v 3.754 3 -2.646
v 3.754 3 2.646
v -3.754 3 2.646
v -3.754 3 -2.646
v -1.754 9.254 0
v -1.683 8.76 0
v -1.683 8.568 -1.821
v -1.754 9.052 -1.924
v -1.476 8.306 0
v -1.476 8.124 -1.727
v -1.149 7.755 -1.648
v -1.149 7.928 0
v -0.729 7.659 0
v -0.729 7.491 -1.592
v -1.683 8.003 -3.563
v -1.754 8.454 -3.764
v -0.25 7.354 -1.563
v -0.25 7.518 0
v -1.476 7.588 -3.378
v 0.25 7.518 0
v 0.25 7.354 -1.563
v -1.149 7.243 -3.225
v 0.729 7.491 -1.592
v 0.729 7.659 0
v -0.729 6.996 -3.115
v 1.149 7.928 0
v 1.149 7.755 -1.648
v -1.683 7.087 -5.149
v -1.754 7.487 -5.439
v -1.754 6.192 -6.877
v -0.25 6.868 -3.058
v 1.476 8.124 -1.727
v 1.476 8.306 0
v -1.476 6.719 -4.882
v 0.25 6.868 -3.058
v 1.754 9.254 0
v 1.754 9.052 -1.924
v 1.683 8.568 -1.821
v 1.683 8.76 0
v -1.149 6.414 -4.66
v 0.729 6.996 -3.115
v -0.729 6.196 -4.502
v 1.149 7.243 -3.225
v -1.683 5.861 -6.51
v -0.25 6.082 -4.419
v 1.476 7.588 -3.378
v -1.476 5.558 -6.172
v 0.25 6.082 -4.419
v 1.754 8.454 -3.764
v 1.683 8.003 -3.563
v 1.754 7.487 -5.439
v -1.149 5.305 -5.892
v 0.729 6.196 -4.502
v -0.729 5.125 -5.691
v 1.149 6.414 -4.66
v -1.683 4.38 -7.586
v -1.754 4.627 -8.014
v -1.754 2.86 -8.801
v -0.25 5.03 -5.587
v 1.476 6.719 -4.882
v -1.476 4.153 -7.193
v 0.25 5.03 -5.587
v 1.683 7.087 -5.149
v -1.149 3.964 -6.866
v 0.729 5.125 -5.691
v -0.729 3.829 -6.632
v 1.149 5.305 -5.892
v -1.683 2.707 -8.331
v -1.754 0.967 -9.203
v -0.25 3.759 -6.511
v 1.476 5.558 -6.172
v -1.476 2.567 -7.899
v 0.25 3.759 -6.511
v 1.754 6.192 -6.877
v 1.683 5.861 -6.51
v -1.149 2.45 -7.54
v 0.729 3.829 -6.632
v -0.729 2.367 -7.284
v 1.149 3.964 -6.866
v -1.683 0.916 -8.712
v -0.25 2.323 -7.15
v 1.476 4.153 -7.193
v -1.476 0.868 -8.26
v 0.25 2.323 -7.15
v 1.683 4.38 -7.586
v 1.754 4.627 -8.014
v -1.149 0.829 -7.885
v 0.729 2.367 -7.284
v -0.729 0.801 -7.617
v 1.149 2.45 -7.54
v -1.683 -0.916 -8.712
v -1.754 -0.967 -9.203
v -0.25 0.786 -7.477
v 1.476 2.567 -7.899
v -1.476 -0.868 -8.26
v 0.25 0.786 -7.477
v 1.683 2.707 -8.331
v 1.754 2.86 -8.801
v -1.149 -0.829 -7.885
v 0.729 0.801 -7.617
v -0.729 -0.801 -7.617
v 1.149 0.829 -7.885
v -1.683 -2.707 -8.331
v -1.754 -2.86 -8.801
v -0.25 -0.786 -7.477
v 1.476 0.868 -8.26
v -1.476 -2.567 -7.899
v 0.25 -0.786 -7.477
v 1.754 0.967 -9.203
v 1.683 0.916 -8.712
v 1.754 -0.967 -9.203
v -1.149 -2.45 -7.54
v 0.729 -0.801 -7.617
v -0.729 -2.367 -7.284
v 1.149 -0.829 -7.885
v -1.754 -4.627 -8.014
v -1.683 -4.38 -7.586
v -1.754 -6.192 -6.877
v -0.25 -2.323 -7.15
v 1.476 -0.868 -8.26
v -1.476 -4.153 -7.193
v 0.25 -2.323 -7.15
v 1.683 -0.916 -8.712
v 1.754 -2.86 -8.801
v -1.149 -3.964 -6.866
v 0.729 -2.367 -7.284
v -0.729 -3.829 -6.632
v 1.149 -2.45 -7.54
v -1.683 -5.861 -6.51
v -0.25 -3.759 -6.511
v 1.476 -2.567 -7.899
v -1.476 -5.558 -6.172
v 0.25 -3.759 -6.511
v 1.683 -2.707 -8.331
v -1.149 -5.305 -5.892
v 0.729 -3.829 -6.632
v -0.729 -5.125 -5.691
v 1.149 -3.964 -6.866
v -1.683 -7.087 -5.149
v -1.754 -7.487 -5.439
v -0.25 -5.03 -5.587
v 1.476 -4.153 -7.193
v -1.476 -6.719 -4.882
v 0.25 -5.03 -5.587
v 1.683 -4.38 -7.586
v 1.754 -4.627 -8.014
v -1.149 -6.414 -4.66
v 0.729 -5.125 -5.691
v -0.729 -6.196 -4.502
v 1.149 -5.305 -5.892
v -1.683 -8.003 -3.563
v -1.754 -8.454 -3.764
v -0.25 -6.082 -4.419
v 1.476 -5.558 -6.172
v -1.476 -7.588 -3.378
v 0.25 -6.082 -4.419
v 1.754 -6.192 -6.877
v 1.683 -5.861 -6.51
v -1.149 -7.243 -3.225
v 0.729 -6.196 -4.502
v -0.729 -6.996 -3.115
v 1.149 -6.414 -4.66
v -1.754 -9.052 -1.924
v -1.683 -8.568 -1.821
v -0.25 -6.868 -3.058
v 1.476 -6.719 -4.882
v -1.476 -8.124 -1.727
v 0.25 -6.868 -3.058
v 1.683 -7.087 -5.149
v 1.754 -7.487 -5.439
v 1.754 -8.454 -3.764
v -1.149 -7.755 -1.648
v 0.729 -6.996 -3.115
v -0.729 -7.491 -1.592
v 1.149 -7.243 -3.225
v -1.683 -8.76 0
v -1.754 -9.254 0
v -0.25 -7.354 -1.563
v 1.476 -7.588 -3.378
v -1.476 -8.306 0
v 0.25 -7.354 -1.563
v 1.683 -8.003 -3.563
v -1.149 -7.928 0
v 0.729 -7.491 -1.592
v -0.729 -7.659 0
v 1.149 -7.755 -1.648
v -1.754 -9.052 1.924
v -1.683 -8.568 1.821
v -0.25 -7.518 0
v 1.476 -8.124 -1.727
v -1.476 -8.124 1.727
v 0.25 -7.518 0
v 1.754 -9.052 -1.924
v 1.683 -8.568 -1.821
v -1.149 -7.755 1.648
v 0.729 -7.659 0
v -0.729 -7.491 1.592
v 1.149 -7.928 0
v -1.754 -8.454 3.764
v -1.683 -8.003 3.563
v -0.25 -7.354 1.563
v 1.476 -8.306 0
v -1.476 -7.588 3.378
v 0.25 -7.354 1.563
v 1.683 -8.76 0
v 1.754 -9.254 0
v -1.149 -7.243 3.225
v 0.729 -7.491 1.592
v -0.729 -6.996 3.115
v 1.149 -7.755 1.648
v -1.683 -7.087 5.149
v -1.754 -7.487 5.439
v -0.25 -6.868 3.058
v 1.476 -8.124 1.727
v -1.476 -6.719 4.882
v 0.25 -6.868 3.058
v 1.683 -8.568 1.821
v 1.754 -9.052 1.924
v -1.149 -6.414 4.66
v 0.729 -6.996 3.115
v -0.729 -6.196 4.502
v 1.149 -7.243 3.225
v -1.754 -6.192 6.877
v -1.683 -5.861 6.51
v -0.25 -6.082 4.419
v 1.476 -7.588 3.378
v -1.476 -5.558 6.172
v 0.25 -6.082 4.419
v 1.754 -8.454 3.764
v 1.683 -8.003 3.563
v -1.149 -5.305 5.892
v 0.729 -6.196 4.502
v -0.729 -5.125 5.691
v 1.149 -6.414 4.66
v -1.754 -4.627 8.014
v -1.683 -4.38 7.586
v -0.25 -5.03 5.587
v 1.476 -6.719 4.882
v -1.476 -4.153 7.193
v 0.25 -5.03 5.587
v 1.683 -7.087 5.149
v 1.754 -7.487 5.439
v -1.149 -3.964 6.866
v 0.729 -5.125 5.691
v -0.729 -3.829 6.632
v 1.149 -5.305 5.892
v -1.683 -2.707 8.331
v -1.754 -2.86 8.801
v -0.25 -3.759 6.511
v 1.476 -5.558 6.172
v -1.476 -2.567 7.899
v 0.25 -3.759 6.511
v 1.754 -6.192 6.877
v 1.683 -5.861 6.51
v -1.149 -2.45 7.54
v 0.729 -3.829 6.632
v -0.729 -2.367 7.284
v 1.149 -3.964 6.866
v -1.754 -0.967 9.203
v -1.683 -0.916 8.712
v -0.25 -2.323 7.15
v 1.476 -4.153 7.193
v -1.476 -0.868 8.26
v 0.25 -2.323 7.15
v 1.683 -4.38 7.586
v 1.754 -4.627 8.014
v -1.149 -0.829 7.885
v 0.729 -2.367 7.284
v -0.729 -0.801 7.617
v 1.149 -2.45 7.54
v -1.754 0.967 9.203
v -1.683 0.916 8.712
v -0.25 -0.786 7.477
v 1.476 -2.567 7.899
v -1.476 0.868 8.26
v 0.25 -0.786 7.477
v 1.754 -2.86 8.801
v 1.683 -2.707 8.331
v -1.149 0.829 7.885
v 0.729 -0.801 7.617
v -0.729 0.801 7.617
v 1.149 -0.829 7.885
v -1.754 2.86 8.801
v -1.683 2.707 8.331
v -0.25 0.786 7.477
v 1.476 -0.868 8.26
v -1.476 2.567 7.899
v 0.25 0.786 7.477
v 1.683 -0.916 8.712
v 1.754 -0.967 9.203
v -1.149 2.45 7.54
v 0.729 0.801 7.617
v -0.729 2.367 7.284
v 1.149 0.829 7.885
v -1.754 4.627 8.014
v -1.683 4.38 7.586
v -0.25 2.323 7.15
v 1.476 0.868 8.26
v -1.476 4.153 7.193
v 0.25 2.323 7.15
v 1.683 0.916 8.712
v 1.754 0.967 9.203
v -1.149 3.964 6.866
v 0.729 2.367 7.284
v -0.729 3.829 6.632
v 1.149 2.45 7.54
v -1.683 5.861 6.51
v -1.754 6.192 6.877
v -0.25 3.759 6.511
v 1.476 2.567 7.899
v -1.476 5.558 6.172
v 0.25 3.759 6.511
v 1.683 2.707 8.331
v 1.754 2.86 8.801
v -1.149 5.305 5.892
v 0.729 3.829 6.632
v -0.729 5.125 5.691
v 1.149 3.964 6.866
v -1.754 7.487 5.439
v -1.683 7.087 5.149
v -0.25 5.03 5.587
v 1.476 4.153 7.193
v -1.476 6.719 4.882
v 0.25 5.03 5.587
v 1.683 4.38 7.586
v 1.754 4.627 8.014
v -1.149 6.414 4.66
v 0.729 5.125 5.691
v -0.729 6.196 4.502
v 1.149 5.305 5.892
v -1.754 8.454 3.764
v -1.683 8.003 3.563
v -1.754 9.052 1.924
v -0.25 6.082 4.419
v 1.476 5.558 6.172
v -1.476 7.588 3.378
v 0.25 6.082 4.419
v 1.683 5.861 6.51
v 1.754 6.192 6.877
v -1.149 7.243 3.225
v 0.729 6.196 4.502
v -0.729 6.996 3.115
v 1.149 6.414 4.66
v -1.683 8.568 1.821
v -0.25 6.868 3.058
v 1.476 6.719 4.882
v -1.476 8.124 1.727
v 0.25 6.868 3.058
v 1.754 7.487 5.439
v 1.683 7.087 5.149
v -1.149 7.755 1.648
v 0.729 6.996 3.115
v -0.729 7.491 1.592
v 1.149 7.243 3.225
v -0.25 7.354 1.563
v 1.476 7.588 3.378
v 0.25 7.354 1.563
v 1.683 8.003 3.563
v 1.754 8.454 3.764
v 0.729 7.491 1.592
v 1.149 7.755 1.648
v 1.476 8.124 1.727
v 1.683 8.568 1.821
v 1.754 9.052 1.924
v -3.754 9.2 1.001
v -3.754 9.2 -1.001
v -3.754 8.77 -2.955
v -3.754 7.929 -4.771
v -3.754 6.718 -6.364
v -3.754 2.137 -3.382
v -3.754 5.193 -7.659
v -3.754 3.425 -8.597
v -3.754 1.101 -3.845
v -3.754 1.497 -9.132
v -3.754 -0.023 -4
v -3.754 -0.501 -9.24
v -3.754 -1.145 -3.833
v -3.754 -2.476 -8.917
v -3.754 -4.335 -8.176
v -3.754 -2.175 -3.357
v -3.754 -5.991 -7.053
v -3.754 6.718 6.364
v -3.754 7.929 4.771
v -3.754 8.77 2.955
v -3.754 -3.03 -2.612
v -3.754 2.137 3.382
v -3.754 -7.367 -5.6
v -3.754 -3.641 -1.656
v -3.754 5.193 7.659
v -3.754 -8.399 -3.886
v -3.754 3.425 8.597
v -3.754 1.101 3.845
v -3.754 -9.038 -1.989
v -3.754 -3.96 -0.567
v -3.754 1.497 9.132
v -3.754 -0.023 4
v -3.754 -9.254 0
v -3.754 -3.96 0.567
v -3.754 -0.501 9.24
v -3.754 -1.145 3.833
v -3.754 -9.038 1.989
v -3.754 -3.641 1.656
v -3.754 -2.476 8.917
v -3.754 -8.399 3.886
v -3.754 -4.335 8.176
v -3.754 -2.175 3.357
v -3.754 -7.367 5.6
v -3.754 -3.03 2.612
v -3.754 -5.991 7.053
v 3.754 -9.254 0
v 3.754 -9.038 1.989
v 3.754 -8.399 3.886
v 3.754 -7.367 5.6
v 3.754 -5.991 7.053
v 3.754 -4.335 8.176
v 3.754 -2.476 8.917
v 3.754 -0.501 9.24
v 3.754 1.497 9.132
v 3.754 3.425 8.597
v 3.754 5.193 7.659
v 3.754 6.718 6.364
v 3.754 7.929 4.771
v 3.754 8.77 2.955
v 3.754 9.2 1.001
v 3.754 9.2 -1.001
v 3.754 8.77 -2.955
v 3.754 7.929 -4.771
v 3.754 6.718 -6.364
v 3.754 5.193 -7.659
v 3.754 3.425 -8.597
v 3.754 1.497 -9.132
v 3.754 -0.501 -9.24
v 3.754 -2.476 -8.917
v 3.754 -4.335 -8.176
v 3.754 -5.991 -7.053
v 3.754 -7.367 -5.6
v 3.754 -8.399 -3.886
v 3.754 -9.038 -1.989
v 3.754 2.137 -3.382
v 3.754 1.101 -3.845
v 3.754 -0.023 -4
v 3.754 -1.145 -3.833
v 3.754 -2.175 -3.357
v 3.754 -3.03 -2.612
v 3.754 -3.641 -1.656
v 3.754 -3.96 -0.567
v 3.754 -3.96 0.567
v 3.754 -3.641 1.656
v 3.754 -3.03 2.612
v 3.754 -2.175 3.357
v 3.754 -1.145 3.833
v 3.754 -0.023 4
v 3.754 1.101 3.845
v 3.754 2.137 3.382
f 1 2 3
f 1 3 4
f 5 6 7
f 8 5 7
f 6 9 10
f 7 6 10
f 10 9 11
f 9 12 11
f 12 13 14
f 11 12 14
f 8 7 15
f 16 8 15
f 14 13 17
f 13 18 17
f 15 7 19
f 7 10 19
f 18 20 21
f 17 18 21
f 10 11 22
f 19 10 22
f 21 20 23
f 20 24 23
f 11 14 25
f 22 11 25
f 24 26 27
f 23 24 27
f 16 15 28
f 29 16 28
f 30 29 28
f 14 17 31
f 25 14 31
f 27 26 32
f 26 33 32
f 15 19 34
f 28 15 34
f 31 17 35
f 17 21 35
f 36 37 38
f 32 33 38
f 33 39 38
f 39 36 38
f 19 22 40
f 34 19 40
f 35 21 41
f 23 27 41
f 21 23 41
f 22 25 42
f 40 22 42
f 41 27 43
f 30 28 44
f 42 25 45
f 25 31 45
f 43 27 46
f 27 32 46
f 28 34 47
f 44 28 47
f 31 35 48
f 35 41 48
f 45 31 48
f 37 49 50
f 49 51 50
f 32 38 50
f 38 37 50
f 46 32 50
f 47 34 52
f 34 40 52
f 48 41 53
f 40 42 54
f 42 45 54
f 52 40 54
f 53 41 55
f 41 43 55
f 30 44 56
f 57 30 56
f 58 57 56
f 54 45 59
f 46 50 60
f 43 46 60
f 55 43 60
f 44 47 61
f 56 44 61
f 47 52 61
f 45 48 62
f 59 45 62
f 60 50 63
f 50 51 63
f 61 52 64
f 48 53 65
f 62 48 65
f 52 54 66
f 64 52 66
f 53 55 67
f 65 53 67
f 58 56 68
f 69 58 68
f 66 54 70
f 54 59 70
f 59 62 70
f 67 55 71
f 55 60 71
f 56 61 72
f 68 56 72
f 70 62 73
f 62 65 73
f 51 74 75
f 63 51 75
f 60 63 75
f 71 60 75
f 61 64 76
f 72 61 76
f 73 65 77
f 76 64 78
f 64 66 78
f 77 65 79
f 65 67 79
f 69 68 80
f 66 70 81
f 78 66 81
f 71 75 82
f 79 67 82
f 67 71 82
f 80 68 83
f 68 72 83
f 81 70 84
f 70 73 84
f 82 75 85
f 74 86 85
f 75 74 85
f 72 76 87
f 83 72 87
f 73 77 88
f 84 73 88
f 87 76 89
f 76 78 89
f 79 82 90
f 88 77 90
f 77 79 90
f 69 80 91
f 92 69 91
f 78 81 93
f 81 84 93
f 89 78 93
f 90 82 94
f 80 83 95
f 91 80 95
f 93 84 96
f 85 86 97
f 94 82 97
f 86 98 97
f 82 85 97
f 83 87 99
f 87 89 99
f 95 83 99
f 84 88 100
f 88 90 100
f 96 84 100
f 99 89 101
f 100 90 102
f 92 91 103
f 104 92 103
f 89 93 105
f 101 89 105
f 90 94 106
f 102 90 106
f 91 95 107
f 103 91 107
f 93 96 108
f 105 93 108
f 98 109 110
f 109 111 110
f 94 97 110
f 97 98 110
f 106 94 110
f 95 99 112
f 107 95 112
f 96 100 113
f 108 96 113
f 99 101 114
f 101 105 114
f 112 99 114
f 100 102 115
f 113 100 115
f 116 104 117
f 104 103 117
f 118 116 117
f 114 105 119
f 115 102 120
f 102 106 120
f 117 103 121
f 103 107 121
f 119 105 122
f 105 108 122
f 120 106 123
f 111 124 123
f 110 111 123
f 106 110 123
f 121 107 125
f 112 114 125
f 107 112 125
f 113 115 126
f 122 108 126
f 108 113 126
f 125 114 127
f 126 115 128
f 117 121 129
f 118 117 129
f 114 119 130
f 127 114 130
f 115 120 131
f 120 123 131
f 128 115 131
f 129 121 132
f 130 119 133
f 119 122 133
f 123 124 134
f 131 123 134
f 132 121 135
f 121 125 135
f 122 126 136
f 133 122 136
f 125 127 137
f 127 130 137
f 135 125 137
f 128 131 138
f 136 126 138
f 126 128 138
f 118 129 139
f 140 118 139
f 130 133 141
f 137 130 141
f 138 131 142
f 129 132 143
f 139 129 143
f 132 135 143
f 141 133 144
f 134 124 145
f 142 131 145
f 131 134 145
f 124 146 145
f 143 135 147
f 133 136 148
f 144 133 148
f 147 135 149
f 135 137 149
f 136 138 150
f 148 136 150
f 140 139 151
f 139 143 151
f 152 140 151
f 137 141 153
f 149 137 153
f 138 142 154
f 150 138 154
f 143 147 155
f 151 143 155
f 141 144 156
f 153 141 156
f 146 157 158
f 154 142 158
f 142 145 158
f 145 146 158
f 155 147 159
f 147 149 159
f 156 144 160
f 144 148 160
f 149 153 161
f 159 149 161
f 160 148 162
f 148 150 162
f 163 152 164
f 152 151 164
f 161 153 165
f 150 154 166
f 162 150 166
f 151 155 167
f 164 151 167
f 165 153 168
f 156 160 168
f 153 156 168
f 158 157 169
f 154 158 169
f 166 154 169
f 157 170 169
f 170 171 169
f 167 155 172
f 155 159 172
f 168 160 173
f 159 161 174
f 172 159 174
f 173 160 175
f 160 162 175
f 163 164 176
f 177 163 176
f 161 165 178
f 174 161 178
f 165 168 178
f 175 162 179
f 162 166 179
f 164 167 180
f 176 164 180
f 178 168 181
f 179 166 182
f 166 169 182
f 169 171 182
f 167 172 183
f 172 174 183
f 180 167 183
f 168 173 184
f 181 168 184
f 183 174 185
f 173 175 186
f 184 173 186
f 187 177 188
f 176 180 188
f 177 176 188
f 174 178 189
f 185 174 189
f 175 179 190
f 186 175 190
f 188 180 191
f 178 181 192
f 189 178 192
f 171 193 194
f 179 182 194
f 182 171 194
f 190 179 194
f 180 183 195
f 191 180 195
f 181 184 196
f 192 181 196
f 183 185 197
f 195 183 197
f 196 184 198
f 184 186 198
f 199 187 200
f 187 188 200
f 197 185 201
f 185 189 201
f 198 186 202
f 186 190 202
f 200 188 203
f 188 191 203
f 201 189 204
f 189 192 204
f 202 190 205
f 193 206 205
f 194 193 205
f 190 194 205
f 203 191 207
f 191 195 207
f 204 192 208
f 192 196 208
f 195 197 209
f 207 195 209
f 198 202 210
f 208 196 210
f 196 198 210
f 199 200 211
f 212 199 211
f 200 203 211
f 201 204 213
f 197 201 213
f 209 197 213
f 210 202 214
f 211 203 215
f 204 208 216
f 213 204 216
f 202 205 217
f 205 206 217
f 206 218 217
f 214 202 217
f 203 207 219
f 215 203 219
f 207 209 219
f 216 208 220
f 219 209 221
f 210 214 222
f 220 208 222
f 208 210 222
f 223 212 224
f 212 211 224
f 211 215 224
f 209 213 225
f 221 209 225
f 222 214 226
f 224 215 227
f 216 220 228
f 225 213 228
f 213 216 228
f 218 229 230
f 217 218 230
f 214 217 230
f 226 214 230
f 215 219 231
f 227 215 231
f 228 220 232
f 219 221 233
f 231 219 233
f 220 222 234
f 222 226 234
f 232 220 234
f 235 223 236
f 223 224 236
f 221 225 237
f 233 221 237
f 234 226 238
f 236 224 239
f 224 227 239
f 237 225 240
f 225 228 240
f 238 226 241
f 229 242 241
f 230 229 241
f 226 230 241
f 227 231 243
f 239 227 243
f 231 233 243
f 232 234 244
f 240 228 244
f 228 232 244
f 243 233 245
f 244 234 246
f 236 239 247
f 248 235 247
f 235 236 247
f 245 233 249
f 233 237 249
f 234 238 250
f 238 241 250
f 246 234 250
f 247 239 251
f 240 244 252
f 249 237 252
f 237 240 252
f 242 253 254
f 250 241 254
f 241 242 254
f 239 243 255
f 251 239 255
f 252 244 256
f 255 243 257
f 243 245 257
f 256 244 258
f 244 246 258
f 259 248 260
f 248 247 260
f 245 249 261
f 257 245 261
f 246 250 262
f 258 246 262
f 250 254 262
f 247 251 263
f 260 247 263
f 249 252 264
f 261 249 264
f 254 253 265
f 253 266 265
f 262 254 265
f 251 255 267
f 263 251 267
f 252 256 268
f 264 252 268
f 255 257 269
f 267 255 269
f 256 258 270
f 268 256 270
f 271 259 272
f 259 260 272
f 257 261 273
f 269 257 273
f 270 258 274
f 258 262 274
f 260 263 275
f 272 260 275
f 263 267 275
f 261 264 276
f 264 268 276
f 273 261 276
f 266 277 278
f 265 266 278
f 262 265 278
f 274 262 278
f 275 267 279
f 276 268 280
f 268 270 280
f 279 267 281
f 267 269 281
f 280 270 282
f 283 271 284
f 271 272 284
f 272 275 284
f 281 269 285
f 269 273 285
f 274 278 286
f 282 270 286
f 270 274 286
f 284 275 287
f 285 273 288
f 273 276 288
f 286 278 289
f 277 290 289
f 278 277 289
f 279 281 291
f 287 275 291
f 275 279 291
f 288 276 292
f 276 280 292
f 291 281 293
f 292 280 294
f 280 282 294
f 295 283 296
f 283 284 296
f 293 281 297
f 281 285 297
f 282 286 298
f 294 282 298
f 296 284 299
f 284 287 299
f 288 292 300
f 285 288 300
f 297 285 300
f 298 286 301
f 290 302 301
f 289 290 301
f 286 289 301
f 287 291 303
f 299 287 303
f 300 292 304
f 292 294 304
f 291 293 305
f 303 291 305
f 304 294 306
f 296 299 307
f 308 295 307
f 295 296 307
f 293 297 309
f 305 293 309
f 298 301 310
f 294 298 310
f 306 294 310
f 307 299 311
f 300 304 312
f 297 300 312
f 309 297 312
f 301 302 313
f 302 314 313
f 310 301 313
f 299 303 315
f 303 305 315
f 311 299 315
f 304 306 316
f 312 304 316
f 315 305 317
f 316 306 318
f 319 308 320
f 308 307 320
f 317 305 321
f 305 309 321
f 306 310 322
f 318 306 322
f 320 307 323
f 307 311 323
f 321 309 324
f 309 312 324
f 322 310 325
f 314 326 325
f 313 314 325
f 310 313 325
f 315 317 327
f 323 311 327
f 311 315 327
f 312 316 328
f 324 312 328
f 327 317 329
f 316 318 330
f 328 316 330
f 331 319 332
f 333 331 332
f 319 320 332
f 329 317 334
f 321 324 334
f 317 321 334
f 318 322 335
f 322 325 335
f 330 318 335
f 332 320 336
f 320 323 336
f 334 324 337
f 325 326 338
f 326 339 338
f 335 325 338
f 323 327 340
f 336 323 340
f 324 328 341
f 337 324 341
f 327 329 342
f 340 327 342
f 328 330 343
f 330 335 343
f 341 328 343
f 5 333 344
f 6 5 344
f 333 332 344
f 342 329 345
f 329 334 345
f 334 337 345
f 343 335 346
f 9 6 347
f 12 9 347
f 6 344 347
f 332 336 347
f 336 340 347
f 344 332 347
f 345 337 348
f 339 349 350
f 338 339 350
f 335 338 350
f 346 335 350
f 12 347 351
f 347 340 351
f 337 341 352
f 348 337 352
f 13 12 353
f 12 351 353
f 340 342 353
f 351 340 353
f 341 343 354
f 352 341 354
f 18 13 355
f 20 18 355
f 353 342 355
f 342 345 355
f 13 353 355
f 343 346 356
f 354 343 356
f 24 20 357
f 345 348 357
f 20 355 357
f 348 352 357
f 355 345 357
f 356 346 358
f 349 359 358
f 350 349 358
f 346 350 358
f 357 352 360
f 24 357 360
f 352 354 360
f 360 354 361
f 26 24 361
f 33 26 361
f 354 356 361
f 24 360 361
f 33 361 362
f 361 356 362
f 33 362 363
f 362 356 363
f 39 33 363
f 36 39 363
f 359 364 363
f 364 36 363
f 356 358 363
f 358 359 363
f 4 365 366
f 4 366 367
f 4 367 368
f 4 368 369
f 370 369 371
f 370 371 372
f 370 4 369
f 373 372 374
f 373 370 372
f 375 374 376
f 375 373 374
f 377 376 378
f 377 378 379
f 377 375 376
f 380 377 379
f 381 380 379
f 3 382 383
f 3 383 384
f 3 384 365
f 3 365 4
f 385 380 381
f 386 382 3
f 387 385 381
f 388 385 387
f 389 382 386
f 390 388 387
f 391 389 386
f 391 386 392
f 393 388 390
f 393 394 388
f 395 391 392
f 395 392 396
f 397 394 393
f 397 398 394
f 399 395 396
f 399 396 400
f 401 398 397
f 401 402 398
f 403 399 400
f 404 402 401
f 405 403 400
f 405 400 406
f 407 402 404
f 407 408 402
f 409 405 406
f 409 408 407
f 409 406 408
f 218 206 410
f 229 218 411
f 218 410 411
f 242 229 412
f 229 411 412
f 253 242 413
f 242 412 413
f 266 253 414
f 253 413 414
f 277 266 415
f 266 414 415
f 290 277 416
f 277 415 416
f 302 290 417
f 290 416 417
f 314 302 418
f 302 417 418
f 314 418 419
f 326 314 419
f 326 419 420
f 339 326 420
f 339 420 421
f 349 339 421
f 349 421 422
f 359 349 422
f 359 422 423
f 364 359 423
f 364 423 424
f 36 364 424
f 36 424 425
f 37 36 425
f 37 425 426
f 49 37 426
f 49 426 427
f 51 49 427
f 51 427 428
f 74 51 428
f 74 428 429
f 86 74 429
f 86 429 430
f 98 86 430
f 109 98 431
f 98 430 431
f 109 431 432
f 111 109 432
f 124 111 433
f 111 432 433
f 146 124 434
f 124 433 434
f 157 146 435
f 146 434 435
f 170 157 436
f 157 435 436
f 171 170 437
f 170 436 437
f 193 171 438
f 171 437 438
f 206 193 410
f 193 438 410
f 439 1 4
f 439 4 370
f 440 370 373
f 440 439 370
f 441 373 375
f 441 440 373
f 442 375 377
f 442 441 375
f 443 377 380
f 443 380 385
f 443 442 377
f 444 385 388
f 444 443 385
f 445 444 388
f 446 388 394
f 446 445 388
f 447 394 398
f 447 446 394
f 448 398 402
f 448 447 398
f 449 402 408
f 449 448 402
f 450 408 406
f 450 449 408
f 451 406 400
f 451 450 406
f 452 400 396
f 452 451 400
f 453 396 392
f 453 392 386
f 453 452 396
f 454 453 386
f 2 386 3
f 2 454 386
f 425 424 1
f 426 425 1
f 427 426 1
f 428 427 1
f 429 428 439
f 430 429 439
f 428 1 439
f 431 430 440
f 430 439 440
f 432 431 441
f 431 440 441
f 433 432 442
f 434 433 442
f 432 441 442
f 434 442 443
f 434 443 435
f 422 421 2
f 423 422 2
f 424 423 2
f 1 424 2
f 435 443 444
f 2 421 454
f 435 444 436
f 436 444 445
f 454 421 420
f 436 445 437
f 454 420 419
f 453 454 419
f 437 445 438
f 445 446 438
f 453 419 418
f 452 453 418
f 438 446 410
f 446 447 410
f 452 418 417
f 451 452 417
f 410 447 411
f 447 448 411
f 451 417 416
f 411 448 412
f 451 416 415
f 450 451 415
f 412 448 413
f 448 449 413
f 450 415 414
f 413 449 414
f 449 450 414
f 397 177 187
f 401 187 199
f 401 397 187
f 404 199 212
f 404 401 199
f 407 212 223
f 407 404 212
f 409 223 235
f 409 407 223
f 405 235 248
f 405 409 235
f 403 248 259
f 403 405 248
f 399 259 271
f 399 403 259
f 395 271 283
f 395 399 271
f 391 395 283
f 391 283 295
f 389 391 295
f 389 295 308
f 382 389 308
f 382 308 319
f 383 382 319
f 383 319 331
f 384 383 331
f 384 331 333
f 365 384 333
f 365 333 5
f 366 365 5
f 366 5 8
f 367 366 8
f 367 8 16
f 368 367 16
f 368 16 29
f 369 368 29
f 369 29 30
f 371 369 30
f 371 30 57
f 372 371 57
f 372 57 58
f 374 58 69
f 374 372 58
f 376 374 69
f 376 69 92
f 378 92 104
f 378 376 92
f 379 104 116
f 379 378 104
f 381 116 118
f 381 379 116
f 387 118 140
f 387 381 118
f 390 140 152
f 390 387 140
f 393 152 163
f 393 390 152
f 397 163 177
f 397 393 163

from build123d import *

# Parameters (mm, degrees)
CUT_EXTRUDE1_DEPTH  = 14.549134849
BOSS_EXTRUDE1_START = 2
SKETCH5_R           = 9.254000034
BOSS_EXTRUDE1_DEPTH = 2


with BuildPart() as part:
    # Sketch3 → Revolve1 (revolve)
    with BuildSketch(Plane.XY):
        with BuildLine():
            Line((1.753997, 0), (-1.753997, 0))
            Line((-1.753997, 0), (-1.753997, 9.254000034))
            ThreePointArc((-1.753997, 9.254000034), (0, 7.500003034), (1.753997, 9.254000034))
            Line((1.753997, 9.254000034), (1.753997, 0))
        make_face()
    revolve(axis=Axis((1.753997, 0, 0), (-1, 0, 0)))

    # Sketch4 → Cut-Extrude1 (cut, through all)
    with BuildSketch(Plane.ZY.offset(1.753997)):
        with BuildLine():
            Line((0, 3), (-2.645751311, 3))
            ThreePointArc((-2.645751311, 3), (0, -4), (2.645751311, 3))
            Line((2.645751311, 3), (0, 3))
        make_face()
    extrude(amount=-CUT_EXTRUDE1_DEPTH, mode=Mode.SUBTRACT)

    # Sketch5 → Boss-Extrude1 (add)
    with BuildSketch(Plane.ZY.offset(1.753997).offset(BOSS_EXTRUDE1_START)):
        Circle(SKETCH5_R)
        with BuildLine():
            Line((2.645751311, 3), (-2.645751311, 3))
            ThreePointArc((-2.645751311, 3), (0, -4), (2.645751311, 3))
        make_face(mode=Mode.SUBTRACT)
    boss_extrude1 = extrude(amount=-BOSS_EXTRUDE1_DEPTH)

    # Mirror1: Boss-Extrude1 across plane
    add(boss_extrude1.mirror(Plane(origin=(0, 0, 0), x_dir=(0, 0, 1), z_dir=(1, 0, 0))))


solid = part.part
